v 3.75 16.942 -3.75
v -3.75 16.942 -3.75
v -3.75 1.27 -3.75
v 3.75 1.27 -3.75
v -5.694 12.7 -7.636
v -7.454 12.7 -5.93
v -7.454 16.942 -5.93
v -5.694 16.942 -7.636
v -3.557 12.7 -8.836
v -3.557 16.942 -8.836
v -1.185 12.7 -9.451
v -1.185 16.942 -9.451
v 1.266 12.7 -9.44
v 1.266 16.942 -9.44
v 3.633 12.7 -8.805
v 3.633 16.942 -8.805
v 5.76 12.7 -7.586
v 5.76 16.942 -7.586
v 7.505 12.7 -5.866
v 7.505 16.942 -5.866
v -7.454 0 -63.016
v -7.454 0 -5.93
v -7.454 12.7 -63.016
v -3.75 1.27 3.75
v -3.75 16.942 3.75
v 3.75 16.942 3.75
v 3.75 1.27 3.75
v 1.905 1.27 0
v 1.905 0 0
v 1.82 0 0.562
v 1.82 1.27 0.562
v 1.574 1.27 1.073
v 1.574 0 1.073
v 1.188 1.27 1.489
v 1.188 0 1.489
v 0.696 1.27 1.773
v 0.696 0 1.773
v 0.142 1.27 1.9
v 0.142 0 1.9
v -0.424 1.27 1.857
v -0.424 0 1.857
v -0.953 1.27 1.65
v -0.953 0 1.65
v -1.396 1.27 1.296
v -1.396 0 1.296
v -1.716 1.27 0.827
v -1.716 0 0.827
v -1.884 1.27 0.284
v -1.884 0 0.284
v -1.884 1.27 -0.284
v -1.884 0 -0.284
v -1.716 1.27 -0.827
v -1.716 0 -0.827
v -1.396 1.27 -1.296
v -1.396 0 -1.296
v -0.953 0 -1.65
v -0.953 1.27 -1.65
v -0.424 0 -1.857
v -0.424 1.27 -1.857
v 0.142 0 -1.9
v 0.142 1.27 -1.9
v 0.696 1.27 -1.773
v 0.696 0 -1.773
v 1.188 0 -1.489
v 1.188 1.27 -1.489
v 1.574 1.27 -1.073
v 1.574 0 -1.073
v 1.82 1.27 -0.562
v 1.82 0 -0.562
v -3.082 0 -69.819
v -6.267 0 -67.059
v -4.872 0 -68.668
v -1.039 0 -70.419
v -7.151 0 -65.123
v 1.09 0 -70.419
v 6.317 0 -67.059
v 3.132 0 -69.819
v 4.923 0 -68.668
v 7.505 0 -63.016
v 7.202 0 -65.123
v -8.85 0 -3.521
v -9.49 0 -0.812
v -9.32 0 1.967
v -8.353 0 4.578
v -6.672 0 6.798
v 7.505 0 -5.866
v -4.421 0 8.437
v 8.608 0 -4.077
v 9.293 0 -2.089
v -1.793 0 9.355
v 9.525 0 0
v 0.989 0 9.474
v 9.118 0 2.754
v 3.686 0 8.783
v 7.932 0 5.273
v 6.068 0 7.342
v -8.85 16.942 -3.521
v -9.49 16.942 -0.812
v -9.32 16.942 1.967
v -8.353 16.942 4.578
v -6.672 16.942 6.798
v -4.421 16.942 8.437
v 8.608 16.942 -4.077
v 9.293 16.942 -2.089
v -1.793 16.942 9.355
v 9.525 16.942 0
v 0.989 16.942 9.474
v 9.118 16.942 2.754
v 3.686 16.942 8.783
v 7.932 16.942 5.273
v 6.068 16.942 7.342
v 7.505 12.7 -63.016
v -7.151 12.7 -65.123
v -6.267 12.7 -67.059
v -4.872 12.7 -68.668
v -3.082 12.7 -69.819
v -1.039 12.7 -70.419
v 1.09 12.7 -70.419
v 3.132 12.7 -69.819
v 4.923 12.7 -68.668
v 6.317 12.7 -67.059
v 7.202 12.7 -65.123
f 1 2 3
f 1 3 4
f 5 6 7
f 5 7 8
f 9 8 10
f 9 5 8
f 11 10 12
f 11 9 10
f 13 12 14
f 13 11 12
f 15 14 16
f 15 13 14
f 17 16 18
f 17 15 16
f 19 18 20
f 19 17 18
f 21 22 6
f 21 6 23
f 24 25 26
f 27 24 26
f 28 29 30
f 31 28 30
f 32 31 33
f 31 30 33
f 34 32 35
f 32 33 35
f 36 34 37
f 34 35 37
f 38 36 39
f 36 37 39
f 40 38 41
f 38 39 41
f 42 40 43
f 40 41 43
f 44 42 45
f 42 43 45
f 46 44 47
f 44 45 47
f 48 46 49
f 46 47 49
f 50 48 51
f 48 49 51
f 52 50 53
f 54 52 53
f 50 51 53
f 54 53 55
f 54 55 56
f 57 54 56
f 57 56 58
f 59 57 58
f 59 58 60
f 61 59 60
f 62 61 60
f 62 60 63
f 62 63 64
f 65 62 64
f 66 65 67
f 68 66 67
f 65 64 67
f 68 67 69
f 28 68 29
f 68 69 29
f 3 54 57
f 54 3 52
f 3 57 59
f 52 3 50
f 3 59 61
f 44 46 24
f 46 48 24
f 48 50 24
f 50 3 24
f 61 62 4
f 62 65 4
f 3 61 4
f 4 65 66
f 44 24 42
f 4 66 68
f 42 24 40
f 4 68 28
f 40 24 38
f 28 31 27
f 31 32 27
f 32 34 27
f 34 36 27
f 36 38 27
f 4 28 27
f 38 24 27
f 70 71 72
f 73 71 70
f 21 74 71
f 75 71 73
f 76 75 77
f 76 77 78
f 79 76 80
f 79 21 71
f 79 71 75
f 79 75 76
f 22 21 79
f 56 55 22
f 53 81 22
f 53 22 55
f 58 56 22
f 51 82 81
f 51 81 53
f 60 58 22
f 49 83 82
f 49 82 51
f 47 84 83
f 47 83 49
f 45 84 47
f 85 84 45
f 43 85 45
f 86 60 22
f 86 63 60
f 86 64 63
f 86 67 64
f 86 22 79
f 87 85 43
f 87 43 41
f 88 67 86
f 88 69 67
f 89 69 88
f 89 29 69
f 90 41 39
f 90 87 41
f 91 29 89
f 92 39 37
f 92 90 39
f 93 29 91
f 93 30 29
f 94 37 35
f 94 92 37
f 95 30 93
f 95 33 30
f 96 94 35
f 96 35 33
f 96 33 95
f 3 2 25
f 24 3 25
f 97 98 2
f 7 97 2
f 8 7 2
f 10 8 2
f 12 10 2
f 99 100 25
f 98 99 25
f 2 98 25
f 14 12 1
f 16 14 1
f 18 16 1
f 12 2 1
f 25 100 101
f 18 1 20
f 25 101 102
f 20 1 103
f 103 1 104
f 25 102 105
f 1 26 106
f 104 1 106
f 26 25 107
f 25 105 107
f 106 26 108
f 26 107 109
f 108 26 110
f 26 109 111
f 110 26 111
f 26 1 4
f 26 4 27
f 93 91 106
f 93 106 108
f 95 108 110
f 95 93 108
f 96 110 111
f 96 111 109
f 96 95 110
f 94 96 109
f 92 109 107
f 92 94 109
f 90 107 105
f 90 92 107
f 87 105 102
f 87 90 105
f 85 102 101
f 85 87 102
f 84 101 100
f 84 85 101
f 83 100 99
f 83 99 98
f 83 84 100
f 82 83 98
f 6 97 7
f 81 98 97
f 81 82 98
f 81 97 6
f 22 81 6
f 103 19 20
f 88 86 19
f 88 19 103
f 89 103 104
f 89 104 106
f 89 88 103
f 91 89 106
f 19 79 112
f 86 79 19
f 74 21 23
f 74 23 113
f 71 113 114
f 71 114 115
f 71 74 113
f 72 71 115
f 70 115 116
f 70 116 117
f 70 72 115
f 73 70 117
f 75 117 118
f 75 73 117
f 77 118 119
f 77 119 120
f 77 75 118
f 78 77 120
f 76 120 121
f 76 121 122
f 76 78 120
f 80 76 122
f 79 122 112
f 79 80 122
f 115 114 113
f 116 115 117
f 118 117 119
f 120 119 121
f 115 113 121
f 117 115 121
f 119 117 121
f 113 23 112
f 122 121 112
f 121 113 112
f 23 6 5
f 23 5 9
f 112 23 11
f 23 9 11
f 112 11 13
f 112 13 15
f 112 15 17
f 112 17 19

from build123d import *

# Parameters (mm, degrees)
F0_W     = 7.5
F0_H     = 7.5
F1_DEPTH = 16.9418
F2_DEPTH = 12.7
F0_R     = 1.905
F3_DEPTH = 1.27


with BuildPart() as f1:
    # F0 (on Front) → F1 (new body)
    with BuildSketch(Plane.XZ):
        with BuildLine():
            ThreePointArc((7.504635, -5.86567), (9.005756, -3.101933), (9.525, 0))
            ThreePointArc((9.525, 0), (-3.140707, 8.992307), (-7.45381, -5.930121))
            ThreePointArc((-7.45381, -5.930121), (0.04104, -9.524912), (7.504635, -5.86567))
        make_face()
        Rectangle(F0_W, F0_H, mode=Mode.SUBTRACT)
    extrude(amount=-F1_DEPTH)

    # F0 (on Front) → F2 (join)
    with BuildSketch(Plane.XZ):
        with BuildLine():
            ThreePointArc((7.504635, -5.86567), (0.04104, -9.524912), (-7.45381, -5.930121))
            Line((-7.45381, -5.930121), (-7.45381, -63.01567))
            ThreePointArc((-7.45381, -63.01567), (0.025412, -70.494892), (7.504635, -63.01567))
            Line((7.504635, -63.01567), (7.504635, -5.86567))
        make_face()
    extrude(amount=-F2_DEPTH)

    # F0 (on Front) → F3 (join)
    with BuildSketch(Plane.XZ):
        Rectangle(F0_W, F0_H)
        Circle(F0_R, mode=Mode.SUBTRACT)
    extrude(amount=-F3_DEPTH)


solid = f1.part
